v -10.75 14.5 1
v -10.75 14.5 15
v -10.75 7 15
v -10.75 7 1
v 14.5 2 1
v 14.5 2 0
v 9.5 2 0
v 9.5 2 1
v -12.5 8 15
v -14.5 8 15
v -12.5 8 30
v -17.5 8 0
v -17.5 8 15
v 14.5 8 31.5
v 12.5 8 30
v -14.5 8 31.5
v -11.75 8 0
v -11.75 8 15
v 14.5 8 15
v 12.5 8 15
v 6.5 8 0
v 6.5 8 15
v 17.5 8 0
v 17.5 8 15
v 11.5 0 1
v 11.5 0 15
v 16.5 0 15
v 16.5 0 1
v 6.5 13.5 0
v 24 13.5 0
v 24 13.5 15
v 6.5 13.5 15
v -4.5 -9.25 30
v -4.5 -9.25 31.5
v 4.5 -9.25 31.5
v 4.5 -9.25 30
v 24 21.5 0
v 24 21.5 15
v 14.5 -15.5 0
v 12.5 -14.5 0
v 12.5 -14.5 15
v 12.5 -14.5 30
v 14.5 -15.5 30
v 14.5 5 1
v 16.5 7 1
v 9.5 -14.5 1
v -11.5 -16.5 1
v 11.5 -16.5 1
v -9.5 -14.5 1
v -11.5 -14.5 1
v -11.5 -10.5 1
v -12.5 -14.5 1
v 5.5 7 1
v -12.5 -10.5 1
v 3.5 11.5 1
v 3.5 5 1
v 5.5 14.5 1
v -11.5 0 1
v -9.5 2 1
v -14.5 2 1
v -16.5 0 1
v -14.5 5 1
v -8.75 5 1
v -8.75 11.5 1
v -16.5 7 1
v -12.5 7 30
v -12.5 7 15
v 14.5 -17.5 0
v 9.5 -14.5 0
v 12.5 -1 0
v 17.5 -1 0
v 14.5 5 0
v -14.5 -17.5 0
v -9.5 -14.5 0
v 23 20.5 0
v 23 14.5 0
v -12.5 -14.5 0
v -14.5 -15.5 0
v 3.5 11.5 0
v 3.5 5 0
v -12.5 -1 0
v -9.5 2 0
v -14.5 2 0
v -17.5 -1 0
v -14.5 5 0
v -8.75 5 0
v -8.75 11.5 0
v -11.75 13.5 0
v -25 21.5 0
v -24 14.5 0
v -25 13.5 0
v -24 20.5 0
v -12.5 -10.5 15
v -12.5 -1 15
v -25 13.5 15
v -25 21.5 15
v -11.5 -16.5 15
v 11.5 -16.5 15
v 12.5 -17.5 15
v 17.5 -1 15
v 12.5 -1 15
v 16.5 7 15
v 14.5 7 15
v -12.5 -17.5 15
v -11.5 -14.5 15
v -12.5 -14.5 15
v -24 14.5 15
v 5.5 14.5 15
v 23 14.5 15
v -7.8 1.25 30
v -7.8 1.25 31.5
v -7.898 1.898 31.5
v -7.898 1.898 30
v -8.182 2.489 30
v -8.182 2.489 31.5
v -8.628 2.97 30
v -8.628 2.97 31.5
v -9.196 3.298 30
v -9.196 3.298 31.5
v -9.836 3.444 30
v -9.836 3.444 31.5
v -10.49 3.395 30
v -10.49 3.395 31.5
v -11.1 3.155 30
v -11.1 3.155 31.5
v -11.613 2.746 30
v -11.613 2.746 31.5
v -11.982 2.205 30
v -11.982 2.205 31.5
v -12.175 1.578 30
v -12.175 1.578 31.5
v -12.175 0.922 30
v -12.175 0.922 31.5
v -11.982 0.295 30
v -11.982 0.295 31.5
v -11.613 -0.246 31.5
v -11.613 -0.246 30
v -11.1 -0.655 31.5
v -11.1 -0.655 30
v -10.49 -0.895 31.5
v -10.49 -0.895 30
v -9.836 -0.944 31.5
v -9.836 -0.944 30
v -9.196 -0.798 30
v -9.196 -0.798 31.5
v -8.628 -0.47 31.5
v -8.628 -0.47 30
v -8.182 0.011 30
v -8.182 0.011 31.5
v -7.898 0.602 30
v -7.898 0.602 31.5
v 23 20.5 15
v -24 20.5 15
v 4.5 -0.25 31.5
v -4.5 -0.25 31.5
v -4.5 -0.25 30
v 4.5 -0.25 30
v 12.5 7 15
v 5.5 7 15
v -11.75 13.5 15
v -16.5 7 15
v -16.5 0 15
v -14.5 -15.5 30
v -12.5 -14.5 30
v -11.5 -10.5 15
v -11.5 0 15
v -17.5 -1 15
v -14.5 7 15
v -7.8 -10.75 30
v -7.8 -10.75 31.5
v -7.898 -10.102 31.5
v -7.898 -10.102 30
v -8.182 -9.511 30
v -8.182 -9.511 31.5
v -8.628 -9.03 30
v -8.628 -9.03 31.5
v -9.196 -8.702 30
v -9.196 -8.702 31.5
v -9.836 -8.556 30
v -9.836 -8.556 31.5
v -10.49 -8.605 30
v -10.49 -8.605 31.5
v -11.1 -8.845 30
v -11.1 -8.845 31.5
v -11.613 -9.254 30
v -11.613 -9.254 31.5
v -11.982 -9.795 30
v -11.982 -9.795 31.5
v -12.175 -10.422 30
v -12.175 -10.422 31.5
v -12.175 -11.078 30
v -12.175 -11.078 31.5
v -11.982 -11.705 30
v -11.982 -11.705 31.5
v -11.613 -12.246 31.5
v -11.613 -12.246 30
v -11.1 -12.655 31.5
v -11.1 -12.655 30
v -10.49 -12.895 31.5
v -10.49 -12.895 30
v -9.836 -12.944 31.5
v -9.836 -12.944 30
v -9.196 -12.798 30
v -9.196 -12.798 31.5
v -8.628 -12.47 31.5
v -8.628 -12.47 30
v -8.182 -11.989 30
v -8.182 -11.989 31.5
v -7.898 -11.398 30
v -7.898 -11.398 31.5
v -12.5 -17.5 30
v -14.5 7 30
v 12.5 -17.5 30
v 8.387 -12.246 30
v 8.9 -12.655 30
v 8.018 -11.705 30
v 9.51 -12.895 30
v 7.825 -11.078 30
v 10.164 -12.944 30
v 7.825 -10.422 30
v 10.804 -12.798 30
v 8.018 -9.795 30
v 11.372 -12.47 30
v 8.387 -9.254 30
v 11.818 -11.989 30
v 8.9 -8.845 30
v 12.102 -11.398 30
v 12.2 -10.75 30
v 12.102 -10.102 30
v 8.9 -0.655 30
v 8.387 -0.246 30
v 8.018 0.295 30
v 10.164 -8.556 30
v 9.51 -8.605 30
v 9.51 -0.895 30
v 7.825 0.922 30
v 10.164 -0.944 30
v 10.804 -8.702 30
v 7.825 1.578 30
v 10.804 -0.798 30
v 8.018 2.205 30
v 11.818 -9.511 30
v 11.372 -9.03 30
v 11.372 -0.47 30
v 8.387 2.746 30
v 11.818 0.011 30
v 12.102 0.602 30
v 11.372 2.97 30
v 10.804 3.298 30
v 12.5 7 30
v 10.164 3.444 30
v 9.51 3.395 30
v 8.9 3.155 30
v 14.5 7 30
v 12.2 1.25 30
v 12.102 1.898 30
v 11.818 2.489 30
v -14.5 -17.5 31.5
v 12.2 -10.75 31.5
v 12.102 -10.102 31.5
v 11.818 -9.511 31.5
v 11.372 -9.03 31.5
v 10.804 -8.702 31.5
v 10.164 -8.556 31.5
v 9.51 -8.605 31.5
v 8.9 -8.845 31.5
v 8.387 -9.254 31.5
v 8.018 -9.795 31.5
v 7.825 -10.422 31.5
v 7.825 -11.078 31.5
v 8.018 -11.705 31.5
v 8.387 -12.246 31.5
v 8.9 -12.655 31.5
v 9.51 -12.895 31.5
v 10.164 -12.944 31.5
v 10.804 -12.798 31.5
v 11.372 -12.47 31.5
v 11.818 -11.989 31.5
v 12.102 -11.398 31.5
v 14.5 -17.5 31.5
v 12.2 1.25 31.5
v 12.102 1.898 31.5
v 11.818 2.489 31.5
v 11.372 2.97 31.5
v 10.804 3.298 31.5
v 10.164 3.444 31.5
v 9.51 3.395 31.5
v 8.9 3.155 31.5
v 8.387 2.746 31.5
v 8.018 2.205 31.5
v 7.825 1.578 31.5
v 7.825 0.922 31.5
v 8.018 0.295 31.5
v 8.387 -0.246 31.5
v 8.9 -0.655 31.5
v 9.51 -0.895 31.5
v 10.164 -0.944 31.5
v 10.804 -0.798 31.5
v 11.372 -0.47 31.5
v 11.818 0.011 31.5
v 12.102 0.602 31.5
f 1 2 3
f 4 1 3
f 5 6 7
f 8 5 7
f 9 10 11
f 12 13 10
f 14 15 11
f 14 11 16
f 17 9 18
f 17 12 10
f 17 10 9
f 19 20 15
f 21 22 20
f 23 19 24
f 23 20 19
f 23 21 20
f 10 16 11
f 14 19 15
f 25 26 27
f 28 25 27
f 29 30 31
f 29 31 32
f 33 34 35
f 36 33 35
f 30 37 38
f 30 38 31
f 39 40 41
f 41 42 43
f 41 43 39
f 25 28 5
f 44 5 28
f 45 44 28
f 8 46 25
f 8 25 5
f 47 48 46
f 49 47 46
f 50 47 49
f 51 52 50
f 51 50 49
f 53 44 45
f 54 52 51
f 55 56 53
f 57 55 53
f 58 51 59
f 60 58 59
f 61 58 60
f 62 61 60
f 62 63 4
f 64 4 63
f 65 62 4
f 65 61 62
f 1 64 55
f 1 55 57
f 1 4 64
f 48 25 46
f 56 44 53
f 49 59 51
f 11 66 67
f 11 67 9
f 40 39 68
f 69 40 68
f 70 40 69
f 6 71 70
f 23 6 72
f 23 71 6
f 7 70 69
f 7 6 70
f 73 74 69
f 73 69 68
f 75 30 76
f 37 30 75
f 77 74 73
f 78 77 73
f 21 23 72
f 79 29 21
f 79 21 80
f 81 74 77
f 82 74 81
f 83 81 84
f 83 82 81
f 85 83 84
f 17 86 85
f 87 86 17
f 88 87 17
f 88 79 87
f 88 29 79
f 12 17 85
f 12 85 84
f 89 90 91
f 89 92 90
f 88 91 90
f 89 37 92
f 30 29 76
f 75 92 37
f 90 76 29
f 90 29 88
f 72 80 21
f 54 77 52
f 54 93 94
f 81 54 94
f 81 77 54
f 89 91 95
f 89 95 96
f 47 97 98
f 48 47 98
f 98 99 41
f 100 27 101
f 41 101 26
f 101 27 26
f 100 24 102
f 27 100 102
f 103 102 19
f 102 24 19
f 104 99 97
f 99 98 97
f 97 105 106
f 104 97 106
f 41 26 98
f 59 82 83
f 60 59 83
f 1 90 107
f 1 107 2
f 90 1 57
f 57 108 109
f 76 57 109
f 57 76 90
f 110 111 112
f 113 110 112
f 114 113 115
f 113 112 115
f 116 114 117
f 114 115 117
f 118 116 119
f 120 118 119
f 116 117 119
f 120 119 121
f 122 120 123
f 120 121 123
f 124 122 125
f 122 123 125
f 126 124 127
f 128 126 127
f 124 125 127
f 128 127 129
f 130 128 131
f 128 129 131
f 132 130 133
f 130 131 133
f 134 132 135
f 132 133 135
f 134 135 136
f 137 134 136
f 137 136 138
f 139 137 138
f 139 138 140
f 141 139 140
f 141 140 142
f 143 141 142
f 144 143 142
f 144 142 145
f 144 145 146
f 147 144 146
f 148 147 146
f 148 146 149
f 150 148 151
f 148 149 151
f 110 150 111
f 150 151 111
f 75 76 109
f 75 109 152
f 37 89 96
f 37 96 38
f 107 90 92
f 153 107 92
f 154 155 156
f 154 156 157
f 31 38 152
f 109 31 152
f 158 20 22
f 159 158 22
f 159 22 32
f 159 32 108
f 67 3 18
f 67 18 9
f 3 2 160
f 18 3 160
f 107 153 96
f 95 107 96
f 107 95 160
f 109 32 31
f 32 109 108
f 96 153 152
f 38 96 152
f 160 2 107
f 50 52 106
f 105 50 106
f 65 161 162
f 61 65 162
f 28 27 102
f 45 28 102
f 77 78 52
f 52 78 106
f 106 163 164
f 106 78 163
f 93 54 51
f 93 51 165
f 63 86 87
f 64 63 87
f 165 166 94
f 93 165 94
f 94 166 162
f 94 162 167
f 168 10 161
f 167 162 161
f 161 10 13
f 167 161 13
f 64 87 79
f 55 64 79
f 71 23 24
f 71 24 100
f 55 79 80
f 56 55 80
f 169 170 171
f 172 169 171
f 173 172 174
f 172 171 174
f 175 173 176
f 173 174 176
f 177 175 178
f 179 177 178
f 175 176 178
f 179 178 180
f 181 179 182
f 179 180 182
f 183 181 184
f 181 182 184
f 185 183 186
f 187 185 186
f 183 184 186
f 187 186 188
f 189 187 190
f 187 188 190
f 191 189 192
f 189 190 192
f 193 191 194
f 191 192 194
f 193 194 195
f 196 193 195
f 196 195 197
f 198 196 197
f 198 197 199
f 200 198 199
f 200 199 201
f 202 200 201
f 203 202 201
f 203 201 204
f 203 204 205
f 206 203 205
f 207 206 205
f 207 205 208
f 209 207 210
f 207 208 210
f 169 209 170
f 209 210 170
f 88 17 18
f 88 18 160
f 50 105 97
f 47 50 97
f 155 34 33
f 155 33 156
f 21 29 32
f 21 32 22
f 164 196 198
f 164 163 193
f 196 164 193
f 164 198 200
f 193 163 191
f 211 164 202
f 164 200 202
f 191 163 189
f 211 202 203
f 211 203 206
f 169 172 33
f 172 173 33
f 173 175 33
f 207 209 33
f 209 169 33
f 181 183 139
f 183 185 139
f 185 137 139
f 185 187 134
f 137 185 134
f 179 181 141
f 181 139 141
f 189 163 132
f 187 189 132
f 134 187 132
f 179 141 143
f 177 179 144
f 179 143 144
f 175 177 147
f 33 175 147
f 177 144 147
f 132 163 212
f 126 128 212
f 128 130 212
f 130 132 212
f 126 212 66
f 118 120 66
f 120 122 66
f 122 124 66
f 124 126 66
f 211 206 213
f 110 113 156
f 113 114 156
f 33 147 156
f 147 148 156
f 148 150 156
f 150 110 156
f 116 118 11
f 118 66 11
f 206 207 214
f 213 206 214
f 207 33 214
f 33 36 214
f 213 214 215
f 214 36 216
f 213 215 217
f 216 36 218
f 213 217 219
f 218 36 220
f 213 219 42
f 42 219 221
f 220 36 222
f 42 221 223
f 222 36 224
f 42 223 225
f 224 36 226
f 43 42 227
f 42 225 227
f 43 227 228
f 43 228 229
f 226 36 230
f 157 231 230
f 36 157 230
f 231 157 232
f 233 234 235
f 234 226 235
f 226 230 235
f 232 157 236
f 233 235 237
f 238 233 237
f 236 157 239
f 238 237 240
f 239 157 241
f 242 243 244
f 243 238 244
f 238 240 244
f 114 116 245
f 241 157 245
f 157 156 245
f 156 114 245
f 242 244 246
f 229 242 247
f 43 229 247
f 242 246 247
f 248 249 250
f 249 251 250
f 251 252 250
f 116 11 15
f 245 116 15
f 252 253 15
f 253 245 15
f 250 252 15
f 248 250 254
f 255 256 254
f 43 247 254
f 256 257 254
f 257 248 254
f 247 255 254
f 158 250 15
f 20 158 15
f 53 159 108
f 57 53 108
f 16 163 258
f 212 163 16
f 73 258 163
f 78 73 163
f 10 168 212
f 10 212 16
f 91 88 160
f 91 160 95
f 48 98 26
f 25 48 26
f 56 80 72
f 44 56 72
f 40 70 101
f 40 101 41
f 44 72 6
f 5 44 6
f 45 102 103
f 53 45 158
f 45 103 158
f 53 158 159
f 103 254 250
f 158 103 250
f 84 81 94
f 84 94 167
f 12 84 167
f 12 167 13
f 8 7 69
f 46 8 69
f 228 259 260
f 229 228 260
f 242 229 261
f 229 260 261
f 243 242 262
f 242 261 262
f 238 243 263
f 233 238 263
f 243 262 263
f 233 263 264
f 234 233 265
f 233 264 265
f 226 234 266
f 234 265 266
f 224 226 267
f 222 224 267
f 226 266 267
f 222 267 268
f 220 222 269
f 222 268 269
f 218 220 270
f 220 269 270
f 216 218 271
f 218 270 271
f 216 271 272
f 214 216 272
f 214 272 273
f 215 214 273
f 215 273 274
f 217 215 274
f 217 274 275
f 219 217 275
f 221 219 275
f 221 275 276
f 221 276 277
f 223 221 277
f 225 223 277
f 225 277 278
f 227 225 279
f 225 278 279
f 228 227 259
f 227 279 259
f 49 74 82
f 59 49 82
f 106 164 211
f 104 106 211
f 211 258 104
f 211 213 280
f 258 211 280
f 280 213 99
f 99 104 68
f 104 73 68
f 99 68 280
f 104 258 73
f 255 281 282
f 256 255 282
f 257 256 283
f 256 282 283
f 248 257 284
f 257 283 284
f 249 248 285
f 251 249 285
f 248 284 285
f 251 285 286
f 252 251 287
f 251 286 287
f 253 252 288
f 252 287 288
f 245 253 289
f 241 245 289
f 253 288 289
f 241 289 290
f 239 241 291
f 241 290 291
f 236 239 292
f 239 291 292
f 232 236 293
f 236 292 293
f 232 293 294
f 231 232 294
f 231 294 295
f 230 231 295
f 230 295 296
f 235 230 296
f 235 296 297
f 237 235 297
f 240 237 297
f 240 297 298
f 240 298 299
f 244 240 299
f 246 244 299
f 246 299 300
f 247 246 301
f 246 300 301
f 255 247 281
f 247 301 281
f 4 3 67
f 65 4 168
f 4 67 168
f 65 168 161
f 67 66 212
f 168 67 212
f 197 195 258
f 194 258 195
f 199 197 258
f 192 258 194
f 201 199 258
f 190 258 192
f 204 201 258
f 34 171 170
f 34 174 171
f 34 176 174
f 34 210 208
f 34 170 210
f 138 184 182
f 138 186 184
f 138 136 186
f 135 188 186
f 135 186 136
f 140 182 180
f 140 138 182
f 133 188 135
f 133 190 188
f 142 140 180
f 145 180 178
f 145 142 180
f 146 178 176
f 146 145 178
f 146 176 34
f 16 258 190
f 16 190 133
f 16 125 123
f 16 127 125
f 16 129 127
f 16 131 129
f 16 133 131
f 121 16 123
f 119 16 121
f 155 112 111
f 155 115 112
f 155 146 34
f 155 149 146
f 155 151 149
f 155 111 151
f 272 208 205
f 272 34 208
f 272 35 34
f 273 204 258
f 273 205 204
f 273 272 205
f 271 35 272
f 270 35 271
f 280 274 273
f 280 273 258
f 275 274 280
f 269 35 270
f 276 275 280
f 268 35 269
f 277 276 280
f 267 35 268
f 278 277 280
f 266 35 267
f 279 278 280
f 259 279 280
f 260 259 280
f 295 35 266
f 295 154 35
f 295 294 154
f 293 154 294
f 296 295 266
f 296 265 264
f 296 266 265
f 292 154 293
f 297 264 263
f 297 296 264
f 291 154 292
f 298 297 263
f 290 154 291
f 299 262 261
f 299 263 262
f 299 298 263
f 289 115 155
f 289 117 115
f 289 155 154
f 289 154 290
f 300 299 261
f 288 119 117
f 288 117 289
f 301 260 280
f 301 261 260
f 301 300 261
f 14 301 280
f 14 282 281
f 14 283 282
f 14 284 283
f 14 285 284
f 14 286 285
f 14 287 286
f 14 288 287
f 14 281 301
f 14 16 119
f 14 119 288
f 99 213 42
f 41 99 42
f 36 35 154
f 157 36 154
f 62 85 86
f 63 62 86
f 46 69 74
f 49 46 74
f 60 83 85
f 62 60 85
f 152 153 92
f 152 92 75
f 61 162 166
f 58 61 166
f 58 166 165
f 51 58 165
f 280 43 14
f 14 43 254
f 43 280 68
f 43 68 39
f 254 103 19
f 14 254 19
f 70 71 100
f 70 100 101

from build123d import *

# Parameters (mm, degrees)
EXTRUDE_1_DEPTH      = 15
CUT_EXTRUDE_1_DEPTH  = 14
SKETCH_7_W           = 47
SKETCH_7_H           = 6
CUT_EXTRUDE_2_DEPTH  = 1
SKETCH_8_W           = 14
SKETCH_8_H           = 4
CUT_EXTRUDE_3_DEPTH  = 1
CUT_EXTRUDE_6_DEPTH  = 1
EXTRUDE_START        = -30
EXTRUDE_10_OUTLINE_W = 2
EXTRUDE_10_OUTLINE_H = 1
EXTRUDE_10_DEPTH     = 30
SKETCH_29_W          = 29
SKETCH_29_H          = 25.5
EXTRUDE_12_DEPTH     = 1.5
SKETCH_30_R          = 2.2
SKETCH_30_W          = 9
SKETCH_30_H          = 9
CUT_EXTRUDE_8_DEPTH  = 1.5


# Read off the part's stored shape, not the designer's step: 凸台-拉伸10
with BuildPart() as part:
    # 草图3 → 凸台-拉伸1 (new body)
    with BuildSketch(Plane.XY):
        Polygon((-25, 21.5), (24, 21.5), (24, 13.5), (6.5, 13.5), (6.5, 8), (17.5, 8), (17.5, -1), (12.5, -1), (12.5, -17.5), (-12.5, -17.5), (-12.5, -1), (-17.5, -1), (-17.5, 8), (-11.75, 8), (-11.75, 13.5), (-25, 13.5), align=None)
    extrude(amount=EXTRUDE_1_DEPTH)

    # 草图4 → 切除-拉伸1 (cut)
    with BuildSketch(Plane.XY.offset(15)):
        Polygon((23, 20.5), (-24, 20.5), (-24, 14.5), (-10.75, 14.5), (-10.75, 7), (-16.5, 7), (-16.5, 0), (-11.5, 0), (-11.5, -16.5), (11.5, -16.5), (11.5, 0), (16.5, 0), (16.5, 7), (5.5, 7), (5.5, 14.5), (23, 14.5), align=None)
    extrude(amount=-CUT_EXTRUDE_1_DEPTH, mode=Mode.SUBTRACT)

    # 草图7 → 切除-拉伸2 (cut)
    with BuildSketch(Plane.XY.offset(1)):
        with Locations((-0.5, 17.5)):
            Rectangle(SKETCH_7_W, SKETCH_7_H)
    extrude(amount=-CUT_EXTRUDE_2_DEPTH, mode=Mode.SUBTRACT)

    # 草图8 → 切除-拉伸3 (cut)
    with BuildSketch(Plane.ZY.offset(12.5)):
        with Locations((8, -12.5)):
            Rectangle(SKETCH_8_W, SKETCH_8_H)
    extrude(amount=-CUT_EXTRUDE_3_DEPTH, mode=Mode.SUBTRACT)

    # 草图9 → 切除-拉伸6 (cut)
    with BuildSketch(Plane(origin=(0, 0, 0), x_dir=(-1, 0, 0), z_dir=(0, 0, -1))):
        Polygon((-3.5, 11.5), (-3.5, 5), (-14.5, 5), (-14.5, 2), (-9.5, 2), (-9.5, -14.5), (9.5, -14.5), (9.5, 2), (14.5, 2), (14.5, 5), (8.75, 5), (8.75, 11.5), align=None)
    extrude(amount=-CUT_EXTRUDE_6_DEPTH, mode=Mode.SUBTRACT)

    # 凸台-拉伸10 outline → 凸台-拉伸10 (add)
    with BuildSketch(Plane(origin=(0, 0, 0), x_dir=(-1, 0, 0), z_dir=(0, 0, -1)).offset(EXTRUDE_START)):
        Polygon((-14.5, -17.5), (-12.5, -17.5), (-12.5, -14.5), (-14.5, -15.5), align=None)
        Polygon((12.5, -17.5), (14.5, -17.5), (14.5, -15.5), (12.5, -14.5), align=None)
        with Locations((-13.5, 7.5)):
            Rectangle(EXTRUDE_10_OUTLINE_W, EXTRUDE_10_OUTLINE_H)
        with Locations((13.5, 7.5)):
            Rectangle(EXTRUDE_10_OUTLINE_W, EXTRUDE_10_OUTLINE_H)
    extrude(amount=EXTRUDE_10_DEPTH)

    # 草图29 → 凸台-拉伸12 (add)
    with BuildSketch(Plane.XY.offset(30)):
        with Locations((0, -4.75)):
            Rectangle(SKETCH_29_W, SKETCH_29_H)
    extrude(amount=EXTRUDE_12_DEPTH)

    # 草图30 → 切除-拉伸8 (cut)
    with BuildSketch(Plane.XY.offset(31.5)):
        with Locations((-10, 1.25)):
            Circle(SKETCH_30_R)
        with Locations((-10, -10.75)):
            Circle(SKETCH_30_R)
        with Locations((10, 1.25)):
            Circle(SKETCH_30_R)
        with Locations((10, -10.75)):
            Circle(SKETCH_30_R)
        with Locations((0, -4.75)):
            Rectangle(SKETCH_30_W, SKETCH_30_H)
    extrude(amount=-CUT_EXTRUDE_8_DEPTH, mode=Mode.SUBTRACT)


solid = part.part
